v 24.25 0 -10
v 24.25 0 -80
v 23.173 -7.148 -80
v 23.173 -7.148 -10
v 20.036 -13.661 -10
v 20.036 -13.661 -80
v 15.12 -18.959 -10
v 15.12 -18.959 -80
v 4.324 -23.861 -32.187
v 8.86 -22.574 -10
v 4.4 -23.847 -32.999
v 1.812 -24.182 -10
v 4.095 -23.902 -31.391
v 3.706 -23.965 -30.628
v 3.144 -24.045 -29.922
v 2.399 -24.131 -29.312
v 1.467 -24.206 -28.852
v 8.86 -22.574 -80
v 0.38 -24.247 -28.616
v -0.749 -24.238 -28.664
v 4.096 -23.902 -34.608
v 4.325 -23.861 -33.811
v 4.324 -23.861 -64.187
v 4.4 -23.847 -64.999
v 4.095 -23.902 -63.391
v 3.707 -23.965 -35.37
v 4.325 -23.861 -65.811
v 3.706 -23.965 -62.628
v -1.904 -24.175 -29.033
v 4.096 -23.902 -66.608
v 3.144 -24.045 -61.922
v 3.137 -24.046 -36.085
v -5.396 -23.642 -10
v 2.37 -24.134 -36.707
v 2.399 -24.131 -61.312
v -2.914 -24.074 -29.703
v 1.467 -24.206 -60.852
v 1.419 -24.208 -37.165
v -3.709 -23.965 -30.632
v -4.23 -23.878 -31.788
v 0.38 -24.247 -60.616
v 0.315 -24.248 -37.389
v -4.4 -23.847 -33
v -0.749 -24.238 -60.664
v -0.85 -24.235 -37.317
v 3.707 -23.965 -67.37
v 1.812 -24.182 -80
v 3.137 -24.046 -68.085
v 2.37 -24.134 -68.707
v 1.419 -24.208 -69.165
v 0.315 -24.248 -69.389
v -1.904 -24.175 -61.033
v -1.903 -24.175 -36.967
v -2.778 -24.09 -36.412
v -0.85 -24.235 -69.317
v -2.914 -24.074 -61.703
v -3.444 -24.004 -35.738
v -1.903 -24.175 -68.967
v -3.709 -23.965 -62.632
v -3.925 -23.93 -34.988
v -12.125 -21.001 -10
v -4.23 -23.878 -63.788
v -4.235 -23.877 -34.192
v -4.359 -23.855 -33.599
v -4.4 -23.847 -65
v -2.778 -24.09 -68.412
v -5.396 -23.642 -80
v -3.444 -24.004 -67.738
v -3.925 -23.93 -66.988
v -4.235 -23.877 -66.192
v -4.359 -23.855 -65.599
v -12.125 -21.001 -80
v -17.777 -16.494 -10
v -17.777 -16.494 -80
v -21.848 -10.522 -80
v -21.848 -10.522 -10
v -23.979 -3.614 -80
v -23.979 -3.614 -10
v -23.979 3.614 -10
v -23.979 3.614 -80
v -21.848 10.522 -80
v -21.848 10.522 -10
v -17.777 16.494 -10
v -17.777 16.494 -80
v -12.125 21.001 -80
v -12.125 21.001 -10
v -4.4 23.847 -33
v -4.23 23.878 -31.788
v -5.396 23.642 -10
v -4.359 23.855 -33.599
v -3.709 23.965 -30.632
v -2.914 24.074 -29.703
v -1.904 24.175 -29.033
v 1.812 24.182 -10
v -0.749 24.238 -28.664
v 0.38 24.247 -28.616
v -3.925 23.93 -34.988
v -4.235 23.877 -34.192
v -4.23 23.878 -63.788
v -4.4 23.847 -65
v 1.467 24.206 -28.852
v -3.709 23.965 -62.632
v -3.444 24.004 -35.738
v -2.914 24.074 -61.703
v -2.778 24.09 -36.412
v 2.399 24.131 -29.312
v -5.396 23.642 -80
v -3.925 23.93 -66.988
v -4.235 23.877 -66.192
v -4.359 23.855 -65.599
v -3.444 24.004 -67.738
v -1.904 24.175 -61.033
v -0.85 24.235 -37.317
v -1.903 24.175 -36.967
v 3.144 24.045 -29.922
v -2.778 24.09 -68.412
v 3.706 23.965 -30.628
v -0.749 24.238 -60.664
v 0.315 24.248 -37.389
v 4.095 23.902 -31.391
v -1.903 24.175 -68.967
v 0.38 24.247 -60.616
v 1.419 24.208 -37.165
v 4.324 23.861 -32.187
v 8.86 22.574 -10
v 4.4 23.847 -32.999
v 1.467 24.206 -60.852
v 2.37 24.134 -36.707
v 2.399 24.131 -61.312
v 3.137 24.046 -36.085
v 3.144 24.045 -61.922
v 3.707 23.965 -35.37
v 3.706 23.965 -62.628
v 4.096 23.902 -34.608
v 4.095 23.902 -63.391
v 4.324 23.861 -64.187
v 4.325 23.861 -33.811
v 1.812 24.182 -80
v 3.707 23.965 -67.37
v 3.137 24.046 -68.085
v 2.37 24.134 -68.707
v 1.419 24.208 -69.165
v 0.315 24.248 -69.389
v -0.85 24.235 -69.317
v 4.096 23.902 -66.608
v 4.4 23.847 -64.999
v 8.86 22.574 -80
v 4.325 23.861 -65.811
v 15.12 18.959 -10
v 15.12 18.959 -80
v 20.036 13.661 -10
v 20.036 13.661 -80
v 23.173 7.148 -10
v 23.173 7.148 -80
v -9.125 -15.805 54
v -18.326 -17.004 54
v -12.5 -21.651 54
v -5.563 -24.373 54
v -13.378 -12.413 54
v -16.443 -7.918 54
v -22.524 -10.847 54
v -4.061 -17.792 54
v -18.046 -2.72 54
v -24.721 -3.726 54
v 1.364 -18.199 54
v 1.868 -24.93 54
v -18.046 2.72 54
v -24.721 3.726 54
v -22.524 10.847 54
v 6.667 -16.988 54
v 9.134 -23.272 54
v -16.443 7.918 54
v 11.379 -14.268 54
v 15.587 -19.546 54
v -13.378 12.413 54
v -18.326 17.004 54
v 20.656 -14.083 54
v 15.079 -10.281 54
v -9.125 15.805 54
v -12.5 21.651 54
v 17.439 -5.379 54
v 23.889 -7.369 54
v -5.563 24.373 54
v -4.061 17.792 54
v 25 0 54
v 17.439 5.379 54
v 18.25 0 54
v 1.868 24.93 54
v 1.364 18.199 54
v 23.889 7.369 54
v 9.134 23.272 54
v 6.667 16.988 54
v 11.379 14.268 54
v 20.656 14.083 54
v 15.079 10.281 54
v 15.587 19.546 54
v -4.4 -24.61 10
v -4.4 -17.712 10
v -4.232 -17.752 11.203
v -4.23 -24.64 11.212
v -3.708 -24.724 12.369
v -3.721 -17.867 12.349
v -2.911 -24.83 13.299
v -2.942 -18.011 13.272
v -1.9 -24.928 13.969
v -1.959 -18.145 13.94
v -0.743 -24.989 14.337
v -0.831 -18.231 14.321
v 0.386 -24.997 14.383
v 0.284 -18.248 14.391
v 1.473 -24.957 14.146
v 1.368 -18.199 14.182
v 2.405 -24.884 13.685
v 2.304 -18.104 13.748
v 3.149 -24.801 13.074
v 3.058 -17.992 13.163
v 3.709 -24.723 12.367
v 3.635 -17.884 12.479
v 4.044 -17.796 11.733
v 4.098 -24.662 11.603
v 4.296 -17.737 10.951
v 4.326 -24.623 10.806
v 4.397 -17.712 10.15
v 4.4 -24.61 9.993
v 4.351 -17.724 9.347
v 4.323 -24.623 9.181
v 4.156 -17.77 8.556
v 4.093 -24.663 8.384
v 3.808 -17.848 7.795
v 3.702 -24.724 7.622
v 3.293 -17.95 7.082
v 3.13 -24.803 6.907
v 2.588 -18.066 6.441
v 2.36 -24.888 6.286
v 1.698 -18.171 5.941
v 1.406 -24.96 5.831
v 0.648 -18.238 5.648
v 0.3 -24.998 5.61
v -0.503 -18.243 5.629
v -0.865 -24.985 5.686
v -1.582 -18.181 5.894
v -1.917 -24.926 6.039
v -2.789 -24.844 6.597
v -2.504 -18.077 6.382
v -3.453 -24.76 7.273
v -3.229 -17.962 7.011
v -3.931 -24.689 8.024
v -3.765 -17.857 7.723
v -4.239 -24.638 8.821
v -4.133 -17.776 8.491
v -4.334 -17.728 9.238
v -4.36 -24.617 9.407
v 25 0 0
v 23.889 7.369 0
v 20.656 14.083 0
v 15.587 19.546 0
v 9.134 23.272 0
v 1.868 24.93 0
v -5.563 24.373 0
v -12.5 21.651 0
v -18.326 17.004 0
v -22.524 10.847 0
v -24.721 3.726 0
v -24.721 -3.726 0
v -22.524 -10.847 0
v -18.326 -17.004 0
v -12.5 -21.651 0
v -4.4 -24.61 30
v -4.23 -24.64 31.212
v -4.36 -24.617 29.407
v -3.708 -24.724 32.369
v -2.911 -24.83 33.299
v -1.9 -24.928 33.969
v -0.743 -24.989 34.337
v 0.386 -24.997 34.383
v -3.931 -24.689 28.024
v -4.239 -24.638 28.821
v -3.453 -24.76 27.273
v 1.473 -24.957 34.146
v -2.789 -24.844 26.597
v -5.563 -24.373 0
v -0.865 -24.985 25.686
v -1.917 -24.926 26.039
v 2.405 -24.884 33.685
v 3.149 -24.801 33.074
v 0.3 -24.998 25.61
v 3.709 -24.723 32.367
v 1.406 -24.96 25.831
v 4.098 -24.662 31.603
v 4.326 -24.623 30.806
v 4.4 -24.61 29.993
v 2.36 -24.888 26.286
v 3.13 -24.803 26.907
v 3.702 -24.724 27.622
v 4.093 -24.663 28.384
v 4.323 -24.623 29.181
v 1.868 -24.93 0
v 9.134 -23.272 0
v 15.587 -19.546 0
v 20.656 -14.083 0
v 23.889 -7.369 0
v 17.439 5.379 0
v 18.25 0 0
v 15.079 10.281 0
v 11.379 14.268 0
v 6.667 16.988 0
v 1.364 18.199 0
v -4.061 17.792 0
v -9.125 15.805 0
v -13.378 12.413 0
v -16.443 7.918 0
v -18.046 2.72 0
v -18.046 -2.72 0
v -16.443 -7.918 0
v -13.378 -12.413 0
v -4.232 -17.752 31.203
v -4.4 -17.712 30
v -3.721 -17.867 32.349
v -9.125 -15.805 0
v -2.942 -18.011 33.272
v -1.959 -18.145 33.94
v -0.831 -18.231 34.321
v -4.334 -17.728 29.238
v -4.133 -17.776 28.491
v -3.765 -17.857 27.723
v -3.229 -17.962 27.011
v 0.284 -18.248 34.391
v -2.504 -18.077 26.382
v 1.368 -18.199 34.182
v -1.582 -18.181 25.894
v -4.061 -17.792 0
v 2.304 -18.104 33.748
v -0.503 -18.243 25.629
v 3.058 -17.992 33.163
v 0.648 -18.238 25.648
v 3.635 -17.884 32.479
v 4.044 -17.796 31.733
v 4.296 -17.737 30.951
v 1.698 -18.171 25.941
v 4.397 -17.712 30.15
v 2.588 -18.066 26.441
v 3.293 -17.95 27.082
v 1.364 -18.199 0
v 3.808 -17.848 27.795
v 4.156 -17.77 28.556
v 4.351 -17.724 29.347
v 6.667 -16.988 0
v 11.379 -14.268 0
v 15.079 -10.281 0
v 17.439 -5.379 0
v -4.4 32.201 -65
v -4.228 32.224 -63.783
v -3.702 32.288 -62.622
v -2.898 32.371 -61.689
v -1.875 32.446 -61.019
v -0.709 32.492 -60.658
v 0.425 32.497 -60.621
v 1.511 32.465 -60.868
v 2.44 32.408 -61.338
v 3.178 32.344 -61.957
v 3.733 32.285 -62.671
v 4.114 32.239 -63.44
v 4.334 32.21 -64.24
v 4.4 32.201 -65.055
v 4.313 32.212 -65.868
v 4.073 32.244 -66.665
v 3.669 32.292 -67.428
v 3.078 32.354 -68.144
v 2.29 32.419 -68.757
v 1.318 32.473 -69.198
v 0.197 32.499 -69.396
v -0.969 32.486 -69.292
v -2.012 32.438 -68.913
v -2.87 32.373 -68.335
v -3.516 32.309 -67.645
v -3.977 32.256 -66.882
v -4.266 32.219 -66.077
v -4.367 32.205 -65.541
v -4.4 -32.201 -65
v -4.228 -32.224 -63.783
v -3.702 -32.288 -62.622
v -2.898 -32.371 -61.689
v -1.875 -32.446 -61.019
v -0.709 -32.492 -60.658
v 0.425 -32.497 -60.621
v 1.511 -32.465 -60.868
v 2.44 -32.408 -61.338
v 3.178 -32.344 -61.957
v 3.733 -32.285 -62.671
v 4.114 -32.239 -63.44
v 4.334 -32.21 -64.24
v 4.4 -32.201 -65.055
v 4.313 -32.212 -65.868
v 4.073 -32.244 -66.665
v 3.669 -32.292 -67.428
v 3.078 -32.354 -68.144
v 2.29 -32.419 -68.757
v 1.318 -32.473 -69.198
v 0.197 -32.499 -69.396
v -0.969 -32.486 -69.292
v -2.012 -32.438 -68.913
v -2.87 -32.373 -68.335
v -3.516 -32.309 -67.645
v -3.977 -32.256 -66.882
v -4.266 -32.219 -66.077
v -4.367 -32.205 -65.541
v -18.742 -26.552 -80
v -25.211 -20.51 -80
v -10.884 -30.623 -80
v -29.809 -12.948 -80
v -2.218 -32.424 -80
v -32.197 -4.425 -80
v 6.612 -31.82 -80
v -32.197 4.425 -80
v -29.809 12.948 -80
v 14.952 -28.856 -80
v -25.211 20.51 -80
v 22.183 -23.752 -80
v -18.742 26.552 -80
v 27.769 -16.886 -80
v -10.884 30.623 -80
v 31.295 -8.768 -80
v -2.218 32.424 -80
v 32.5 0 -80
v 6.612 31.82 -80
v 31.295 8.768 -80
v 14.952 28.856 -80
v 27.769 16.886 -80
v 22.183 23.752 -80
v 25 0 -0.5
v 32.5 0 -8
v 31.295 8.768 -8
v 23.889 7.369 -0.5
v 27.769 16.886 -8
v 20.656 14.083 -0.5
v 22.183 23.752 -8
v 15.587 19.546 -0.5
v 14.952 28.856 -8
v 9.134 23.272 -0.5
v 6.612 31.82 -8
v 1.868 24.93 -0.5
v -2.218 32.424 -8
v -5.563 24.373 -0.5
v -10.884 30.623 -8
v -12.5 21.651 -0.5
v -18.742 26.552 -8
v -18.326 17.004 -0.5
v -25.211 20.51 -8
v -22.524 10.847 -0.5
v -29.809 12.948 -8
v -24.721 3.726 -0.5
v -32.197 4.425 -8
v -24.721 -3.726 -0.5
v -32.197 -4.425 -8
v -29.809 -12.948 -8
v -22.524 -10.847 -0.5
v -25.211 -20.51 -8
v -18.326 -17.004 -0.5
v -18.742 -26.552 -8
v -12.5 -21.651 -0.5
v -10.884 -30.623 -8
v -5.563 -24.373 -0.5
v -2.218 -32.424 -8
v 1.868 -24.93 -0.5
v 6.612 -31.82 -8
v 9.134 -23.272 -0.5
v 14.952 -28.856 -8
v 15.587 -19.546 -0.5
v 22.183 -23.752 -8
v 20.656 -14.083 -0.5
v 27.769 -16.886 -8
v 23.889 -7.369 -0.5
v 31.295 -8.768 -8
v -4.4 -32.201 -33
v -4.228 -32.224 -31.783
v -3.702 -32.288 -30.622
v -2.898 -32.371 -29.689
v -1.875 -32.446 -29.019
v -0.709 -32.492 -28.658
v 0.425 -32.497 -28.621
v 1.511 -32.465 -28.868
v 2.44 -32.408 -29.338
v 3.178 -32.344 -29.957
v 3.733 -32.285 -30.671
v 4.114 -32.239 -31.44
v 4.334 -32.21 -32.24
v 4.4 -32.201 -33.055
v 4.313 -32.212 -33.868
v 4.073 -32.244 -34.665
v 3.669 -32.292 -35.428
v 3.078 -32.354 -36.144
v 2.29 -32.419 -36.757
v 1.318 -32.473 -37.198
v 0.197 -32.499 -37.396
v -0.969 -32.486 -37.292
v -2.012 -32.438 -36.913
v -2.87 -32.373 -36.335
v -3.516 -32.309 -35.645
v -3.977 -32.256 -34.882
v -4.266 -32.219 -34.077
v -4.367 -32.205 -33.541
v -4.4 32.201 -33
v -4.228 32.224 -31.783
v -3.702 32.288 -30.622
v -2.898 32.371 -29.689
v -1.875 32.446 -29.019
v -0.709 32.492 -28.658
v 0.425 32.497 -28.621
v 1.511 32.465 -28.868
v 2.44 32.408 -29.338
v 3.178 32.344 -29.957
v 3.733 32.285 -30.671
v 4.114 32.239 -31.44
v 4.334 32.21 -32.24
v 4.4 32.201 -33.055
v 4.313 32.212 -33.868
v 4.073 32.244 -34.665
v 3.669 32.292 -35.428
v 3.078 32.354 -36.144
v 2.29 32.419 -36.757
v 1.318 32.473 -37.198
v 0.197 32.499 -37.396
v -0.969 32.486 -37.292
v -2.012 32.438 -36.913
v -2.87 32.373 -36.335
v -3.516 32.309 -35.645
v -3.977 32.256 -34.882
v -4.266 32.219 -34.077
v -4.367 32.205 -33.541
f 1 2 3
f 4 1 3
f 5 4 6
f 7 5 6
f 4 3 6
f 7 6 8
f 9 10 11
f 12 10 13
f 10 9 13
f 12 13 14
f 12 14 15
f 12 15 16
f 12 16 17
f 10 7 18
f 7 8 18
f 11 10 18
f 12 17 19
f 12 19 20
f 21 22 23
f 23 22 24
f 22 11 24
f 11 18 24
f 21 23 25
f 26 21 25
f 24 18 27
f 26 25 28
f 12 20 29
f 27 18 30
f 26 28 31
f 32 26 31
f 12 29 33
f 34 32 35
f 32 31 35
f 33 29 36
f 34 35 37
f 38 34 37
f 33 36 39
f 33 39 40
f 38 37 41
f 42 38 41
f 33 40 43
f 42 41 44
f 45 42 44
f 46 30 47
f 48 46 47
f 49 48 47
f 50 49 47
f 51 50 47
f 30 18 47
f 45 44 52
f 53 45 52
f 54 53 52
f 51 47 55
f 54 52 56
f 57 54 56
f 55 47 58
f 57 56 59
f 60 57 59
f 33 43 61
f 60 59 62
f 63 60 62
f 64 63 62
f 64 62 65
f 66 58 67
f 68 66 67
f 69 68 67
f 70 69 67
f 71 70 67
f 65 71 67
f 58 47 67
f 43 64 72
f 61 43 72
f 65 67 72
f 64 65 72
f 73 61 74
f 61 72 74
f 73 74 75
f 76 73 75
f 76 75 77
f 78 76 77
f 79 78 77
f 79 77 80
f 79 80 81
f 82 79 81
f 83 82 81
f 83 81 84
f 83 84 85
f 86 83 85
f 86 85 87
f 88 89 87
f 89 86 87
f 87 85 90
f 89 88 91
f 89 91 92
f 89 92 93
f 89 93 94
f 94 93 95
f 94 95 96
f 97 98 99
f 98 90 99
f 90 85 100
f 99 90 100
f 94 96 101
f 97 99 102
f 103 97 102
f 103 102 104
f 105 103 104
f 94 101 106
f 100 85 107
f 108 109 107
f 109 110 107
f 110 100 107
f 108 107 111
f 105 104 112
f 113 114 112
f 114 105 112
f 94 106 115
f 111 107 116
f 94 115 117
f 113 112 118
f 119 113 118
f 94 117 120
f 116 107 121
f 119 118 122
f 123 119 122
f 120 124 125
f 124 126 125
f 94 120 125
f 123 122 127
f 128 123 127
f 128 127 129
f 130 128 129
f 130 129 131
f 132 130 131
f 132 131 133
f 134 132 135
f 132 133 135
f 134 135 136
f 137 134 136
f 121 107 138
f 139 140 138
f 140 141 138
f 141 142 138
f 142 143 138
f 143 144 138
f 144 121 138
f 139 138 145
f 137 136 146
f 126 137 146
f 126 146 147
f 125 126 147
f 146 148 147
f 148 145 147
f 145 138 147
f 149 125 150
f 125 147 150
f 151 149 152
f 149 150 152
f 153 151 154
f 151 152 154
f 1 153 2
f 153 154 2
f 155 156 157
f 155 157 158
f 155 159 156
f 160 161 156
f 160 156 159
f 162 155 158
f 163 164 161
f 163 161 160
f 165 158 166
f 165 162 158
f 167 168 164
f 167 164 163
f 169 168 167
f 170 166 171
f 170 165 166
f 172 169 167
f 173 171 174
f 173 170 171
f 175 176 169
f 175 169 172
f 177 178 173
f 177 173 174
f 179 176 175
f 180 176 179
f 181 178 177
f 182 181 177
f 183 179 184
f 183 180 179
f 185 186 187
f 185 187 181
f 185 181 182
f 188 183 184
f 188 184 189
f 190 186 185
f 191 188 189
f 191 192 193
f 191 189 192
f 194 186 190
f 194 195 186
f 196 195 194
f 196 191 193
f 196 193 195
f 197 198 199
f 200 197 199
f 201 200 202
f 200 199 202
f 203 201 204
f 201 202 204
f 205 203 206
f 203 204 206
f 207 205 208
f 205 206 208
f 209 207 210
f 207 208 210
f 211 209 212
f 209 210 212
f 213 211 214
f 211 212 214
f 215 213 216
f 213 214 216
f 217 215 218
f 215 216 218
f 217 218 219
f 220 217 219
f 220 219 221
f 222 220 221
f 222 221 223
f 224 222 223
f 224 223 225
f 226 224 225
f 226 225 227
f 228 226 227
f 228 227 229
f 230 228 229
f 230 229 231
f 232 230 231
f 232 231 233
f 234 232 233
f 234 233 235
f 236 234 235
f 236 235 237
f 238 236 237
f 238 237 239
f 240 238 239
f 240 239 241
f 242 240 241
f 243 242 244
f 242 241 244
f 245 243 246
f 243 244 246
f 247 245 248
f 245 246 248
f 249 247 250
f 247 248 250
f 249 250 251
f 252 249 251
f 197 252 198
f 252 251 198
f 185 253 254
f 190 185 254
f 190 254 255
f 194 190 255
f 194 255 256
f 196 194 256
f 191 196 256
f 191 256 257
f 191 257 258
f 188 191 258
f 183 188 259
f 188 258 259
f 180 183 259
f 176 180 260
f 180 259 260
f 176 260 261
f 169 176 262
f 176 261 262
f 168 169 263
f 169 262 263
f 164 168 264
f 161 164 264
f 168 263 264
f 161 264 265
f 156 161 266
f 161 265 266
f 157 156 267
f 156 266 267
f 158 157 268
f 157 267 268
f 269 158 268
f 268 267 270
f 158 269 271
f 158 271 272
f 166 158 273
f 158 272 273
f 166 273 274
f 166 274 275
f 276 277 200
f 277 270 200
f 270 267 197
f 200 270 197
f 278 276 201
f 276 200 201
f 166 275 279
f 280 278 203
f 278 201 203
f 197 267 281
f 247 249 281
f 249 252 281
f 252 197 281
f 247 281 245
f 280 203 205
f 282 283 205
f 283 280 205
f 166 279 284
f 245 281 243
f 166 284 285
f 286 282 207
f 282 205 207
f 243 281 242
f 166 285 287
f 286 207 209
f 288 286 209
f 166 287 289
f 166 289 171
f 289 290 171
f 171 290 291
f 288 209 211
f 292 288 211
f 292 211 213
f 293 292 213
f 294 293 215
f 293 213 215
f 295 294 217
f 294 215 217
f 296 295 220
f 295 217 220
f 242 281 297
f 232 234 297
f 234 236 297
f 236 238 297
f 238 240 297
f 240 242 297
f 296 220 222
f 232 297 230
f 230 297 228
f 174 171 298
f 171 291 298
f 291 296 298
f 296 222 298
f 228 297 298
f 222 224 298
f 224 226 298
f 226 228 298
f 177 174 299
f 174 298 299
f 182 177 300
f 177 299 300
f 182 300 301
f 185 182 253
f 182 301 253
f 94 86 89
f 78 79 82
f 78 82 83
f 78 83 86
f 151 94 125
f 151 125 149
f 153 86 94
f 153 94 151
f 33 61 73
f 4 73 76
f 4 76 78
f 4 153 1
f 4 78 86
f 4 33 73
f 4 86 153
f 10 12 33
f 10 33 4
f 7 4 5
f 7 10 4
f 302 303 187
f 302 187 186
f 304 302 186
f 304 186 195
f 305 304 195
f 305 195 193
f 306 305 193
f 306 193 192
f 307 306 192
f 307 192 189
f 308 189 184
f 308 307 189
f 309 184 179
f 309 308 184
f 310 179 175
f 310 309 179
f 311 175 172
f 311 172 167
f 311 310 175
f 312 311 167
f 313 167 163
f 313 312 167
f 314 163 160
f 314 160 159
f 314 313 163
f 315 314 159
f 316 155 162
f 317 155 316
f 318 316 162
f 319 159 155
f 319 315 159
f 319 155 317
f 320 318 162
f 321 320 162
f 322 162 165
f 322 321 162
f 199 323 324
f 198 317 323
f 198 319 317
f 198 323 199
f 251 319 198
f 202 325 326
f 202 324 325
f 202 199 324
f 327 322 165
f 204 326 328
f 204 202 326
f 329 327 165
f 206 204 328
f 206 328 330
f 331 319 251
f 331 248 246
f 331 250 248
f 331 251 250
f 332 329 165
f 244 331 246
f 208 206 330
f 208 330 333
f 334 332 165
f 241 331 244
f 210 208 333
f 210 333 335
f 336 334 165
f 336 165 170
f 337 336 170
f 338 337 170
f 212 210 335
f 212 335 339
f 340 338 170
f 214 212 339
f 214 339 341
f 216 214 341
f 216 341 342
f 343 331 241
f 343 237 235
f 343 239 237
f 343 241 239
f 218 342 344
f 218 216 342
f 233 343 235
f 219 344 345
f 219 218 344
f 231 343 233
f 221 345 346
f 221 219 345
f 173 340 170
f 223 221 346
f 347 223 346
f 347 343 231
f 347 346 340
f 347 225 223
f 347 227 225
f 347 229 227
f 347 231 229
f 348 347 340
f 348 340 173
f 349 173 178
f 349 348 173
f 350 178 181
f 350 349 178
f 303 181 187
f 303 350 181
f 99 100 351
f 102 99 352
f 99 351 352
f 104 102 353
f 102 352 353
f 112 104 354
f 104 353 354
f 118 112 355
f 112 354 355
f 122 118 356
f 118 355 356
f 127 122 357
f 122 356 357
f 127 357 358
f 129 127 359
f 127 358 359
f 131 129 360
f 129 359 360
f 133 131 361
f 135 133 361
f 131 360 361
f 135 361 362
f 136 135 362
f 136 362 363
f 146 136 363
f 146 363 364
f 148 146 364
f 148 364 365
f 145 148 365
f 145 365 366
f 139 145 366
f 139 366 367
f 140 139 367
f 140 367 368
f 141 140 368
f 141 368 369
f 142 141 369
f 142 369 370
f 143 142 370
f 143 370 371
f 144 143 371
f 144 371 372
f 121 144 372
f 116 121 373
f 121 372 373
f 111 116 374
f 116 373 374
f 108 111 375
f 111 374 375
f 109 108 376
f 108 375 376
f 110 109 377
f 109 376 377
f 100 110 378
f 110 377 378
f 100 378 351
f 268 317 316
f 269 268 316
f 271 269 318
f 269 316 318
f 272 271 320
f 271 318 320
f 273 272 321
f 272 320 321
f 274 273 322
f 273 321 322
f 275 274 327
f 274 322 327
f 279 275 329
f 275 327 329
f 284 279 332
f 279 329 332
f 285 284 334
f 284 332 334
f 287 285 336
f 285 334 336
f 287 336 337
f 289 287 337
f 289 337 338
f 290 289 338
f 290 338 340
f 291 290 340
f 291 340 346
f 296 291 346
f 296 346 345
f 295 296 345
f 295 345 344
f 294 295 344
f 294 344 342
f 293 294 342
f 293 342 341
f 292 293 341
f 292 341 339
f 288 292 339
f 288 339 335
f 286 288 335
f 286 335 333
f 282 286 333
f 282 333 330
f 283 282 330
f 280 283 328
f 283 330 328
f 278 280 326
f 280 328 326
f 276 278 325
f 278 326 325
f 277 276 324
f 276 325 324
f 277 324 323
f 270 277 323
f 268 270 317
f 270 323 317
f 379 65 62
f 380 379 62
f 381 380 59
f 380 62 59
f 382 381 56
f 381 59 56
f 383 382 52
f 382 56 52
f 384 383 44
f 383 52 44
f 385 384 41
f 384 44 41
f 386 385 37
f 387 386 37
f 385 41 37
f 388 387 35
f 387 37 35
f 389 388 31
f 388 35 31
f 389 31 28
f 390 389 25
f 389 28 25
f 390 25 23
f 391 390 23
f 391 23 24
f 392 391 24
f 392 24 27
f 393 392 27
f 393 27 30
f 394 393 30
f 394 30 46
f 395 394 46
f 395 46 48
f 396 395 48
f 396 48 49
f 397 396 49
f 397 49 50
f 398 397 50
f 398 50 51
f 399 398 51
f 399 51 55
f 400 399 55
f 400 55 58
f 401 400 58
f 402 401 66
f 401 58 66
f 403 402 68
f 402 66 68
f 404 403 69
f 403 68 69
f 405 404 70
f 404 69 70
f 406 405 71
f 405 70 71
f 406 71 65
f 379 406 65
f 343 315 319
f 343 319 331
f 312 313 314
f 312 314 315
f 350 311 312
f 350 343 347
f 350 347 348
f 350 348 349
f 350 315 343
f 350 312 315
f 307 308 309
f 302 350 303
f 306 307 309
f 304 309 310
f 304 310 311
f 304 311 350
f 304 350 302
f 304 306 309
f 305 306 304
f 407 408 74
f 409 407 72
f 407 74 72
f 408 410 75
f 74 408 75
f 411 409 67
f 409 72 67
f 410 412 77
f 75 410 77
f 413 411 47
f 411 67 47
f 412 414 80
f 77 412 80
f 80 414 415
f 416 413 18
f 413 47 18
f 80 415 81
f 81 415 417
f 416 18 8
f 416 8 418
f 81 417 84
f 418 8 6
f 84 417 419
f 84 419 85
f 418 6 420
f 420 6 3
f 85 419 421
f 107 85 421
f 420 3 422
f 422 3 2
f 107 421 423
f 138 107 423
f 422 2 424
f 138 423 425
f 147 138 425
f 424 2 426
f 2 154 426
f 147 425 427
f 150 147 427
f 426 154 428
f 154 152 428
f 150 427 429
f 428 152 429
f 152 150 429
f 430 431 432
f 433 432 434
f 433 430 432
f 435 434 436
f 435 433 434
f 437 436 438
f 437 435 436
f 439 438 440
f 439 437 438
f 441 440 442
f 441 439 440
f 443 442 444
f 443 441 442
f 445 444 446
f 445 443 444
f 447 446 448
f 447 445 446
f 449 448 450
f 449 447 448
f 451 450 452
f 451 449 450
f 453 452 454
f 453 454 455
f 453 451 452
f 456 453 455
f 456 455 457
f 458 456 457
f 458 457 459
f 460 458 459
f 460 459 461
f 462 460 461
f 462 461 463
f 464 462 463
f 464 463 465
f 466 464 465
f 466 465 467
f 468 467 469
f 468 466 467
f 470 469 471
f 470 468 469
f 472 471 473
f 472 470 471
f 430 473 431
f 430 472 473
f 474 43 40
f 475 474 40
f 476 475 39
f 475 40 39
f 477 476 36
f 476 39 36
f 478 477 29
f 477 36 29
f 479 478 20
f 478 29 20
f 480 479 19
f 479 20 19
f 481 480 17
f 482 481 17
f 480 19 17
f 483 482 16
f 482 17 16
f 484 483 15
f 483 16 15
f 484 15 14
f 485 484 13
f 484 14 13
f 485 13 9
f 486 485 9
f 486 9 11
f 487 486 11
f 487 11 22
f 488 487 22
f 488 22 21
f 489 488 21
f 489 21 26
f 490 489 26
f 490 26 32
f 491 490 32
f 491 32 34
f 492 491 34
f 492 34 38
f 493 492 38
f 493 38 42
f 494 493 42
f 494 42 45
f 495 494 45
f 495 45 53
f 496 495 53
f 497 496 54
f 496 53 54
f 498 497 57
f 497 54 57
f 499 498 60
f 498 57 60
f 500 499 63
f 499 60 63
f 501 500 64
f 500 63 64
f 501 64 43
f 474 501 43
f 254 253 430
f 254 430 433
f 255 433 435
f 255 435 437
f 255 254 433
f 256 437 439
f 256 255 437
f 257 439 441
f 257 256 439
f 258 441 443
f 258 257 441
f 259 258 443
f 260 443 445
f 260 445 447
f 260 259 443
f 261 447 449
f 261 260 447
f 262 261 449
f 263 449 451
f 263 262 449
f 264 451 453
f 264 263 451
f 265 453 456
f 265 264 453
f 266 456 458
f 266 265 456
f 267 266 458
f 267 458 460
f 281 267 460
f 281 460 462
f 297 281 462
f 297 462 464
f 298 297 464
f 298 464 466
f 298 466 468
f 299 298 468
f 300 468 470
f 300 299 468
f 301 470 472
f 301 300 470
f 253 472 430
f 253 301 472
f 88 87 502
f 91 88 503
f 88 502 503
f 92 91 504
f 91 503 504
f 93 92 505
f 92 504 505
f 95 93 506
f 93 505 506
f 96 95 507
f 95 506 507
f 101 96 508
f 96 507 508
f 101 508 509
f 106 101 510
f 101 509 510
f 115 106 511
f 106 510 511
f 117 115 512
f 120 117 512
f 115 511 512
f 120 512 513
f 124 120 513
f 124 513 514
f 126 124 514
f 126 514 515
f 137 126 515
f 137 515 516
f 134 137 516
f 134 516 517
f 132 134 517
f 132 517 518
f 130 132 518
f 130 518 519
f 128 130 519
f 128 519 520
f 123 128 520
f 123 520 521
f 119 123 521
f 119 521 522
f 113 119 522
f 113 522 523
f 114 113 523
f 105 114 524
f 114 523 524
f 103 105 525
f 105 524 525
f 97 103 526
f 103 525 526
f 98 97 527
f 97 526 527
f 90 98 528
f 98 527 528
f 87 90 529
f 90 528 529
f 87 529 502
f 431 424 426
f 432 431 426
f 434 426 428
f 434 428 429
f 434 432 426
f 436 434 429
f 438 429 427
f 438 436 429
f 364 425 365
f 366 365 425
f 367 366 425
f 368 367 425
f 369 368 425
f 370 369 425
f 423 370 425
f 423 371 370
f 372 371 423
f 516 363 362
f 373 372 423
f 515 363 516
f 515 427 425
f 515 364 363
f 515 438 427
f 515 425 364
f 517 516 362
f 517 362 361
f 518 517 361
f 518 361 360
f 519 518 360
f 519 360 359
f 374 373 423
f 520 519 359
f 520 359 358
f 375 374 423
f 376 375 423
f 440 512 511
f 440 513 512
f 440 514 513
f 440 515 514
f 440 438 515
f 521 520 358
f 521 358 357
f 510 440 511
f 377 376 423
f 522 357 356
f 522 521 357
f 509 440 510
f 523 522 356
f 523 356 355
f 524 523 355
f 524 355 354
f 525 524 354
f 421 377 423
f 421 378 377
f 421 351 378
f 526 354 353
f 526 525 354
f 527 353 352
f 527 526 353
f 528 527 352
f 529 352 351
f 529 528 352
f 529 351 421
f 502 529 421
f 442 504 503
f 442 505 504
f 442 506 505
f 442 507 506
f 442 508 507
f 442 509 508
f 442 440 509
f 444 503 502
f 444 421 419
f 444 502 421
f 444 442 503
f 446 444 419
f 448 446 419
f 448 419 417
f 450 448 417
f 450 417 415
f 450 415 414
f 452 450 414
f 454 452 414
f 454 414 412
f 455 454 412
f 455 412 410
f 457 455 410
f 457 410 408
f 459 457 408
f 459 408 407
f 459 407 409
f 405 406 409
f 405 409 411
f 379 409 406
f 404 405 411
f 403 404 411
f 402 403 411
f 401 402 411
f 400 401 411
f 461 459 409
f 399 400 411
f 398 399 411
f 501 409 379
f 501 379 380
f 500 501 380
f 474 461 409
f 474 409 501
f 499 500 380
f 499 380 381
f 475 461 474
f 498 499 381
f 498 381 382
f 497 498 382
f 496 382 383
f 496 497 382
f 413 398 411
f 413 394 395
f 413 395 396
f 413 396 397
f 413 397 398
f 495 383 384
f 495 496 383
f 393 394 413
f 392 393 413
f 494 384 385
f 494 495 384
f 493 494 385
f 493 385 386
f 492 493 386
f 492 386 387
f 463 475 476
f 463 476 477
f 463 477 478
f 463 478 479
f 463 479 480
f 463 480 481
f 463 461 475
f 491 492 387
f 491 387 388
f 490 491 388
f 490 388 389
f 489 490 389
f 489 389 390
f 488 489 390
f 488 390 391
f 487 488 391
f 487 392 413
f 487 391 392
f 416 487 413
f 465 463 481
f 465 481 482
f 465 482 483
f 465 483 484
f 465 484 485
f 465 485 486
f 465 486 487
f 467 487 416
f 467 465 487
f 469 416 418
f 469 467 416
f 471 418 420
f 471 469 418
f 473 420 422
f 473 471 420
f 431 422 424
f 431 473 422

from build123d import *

# Parameters (mm, degrees)
F0_R        = 25
F0_R_2      = 18.25
F1_DEPTH    = 54
F4_D        = 8.8
F4_DEPTH    = 15.75
F4_START    = 1.3902459
F4_TIP      = 2.6437867237
F5_R        = 32.5
F6_DEPTH    = 80
F7_R        = 24.25
F8_DEPTH    = 70
F9_S5_R     = 25
F9_T6_DEPTH = 48
F12_D       = 8.8


# Not quite as in the source:
# - a fillet or chamfer that OpenCascade refuses, or shapes differently, is made with other operations: its cross-section is extruded or revolved along the edge and cut away or added


with BuildPart() as f1:
    # F0 (on Top) → F1 (new body)
    with BuildSketch(Plane.XY):
        Circle(F0_R)
        Circle(F0_R_2, mode=Mode.SUBTRACT)
    extrude(amount=F1_DEPTH)

    # F4
    # its depths count from where the whole tool has entered the part; down to there all is cleared
    with Locations(Plane.XZ.offset(26).offset(-F4_START)):
        with Locations((0, 10), (0, 30)):
            Hole(F4_D / 2, depth=F4_DEPTH)
            with Locations((0, 0, -(F4_DEPTH + F4_TIP / 2))):  # 118° drill point
                Cone(0, F4_D / 2, F4_TIP, mode=Mode.SUBTRACT)

    # F5 (on face) → F6 (join)
    with BuildSketch(Plane.XY):
        Circle(F5_R)
    extrude(amount=-F6_DEPTH)

    # F7 (on face) → F8 (cut)
    with BuildSketch(Plane(origin=(0, 0, -80), x_dir=(1, 0, 0), z_dir=(0, 0, -1))):
        Circle(F7_R)
    extrude(amount=-F8_DEPTH, mode=Mode.SUBTRACT)

    # F9: chamfer of 8 on 1 edges, made by hand


with BuildPart() as f9_tool2:
    # F9_s3 → F9_t4 (revolve)
    with BuildSketch(Plane.XZ):
        Polygon((32.5, -8), (24.5, 0), (32.5, 0), align=None)
    revolve(axis=Axis((0, 0, 0), (0, 0, 1)))

    # F9_s5 → F9_t6 (cut, symmetric)
    with BuildSketch(Plane.XY.offset(-4)):
        Circle(F9_S5_R)
    extrude(amount=F9_T6_DEPTH, both=True, mode=Mode.SUBTRACT)


with BuildPart() as f1_1:
    add(f1.part)

    # F9_t1: cut F9_tool2
    add(f9_tool2.part, mode=Mode.SUBTRACT)

    # F12 (through all)
    with Locations(Plane.XZ.offset(51)):
        with Locations((0, -33), (0, -65)):
            Hole(F12_D / 2)


solid = f1_1.part
